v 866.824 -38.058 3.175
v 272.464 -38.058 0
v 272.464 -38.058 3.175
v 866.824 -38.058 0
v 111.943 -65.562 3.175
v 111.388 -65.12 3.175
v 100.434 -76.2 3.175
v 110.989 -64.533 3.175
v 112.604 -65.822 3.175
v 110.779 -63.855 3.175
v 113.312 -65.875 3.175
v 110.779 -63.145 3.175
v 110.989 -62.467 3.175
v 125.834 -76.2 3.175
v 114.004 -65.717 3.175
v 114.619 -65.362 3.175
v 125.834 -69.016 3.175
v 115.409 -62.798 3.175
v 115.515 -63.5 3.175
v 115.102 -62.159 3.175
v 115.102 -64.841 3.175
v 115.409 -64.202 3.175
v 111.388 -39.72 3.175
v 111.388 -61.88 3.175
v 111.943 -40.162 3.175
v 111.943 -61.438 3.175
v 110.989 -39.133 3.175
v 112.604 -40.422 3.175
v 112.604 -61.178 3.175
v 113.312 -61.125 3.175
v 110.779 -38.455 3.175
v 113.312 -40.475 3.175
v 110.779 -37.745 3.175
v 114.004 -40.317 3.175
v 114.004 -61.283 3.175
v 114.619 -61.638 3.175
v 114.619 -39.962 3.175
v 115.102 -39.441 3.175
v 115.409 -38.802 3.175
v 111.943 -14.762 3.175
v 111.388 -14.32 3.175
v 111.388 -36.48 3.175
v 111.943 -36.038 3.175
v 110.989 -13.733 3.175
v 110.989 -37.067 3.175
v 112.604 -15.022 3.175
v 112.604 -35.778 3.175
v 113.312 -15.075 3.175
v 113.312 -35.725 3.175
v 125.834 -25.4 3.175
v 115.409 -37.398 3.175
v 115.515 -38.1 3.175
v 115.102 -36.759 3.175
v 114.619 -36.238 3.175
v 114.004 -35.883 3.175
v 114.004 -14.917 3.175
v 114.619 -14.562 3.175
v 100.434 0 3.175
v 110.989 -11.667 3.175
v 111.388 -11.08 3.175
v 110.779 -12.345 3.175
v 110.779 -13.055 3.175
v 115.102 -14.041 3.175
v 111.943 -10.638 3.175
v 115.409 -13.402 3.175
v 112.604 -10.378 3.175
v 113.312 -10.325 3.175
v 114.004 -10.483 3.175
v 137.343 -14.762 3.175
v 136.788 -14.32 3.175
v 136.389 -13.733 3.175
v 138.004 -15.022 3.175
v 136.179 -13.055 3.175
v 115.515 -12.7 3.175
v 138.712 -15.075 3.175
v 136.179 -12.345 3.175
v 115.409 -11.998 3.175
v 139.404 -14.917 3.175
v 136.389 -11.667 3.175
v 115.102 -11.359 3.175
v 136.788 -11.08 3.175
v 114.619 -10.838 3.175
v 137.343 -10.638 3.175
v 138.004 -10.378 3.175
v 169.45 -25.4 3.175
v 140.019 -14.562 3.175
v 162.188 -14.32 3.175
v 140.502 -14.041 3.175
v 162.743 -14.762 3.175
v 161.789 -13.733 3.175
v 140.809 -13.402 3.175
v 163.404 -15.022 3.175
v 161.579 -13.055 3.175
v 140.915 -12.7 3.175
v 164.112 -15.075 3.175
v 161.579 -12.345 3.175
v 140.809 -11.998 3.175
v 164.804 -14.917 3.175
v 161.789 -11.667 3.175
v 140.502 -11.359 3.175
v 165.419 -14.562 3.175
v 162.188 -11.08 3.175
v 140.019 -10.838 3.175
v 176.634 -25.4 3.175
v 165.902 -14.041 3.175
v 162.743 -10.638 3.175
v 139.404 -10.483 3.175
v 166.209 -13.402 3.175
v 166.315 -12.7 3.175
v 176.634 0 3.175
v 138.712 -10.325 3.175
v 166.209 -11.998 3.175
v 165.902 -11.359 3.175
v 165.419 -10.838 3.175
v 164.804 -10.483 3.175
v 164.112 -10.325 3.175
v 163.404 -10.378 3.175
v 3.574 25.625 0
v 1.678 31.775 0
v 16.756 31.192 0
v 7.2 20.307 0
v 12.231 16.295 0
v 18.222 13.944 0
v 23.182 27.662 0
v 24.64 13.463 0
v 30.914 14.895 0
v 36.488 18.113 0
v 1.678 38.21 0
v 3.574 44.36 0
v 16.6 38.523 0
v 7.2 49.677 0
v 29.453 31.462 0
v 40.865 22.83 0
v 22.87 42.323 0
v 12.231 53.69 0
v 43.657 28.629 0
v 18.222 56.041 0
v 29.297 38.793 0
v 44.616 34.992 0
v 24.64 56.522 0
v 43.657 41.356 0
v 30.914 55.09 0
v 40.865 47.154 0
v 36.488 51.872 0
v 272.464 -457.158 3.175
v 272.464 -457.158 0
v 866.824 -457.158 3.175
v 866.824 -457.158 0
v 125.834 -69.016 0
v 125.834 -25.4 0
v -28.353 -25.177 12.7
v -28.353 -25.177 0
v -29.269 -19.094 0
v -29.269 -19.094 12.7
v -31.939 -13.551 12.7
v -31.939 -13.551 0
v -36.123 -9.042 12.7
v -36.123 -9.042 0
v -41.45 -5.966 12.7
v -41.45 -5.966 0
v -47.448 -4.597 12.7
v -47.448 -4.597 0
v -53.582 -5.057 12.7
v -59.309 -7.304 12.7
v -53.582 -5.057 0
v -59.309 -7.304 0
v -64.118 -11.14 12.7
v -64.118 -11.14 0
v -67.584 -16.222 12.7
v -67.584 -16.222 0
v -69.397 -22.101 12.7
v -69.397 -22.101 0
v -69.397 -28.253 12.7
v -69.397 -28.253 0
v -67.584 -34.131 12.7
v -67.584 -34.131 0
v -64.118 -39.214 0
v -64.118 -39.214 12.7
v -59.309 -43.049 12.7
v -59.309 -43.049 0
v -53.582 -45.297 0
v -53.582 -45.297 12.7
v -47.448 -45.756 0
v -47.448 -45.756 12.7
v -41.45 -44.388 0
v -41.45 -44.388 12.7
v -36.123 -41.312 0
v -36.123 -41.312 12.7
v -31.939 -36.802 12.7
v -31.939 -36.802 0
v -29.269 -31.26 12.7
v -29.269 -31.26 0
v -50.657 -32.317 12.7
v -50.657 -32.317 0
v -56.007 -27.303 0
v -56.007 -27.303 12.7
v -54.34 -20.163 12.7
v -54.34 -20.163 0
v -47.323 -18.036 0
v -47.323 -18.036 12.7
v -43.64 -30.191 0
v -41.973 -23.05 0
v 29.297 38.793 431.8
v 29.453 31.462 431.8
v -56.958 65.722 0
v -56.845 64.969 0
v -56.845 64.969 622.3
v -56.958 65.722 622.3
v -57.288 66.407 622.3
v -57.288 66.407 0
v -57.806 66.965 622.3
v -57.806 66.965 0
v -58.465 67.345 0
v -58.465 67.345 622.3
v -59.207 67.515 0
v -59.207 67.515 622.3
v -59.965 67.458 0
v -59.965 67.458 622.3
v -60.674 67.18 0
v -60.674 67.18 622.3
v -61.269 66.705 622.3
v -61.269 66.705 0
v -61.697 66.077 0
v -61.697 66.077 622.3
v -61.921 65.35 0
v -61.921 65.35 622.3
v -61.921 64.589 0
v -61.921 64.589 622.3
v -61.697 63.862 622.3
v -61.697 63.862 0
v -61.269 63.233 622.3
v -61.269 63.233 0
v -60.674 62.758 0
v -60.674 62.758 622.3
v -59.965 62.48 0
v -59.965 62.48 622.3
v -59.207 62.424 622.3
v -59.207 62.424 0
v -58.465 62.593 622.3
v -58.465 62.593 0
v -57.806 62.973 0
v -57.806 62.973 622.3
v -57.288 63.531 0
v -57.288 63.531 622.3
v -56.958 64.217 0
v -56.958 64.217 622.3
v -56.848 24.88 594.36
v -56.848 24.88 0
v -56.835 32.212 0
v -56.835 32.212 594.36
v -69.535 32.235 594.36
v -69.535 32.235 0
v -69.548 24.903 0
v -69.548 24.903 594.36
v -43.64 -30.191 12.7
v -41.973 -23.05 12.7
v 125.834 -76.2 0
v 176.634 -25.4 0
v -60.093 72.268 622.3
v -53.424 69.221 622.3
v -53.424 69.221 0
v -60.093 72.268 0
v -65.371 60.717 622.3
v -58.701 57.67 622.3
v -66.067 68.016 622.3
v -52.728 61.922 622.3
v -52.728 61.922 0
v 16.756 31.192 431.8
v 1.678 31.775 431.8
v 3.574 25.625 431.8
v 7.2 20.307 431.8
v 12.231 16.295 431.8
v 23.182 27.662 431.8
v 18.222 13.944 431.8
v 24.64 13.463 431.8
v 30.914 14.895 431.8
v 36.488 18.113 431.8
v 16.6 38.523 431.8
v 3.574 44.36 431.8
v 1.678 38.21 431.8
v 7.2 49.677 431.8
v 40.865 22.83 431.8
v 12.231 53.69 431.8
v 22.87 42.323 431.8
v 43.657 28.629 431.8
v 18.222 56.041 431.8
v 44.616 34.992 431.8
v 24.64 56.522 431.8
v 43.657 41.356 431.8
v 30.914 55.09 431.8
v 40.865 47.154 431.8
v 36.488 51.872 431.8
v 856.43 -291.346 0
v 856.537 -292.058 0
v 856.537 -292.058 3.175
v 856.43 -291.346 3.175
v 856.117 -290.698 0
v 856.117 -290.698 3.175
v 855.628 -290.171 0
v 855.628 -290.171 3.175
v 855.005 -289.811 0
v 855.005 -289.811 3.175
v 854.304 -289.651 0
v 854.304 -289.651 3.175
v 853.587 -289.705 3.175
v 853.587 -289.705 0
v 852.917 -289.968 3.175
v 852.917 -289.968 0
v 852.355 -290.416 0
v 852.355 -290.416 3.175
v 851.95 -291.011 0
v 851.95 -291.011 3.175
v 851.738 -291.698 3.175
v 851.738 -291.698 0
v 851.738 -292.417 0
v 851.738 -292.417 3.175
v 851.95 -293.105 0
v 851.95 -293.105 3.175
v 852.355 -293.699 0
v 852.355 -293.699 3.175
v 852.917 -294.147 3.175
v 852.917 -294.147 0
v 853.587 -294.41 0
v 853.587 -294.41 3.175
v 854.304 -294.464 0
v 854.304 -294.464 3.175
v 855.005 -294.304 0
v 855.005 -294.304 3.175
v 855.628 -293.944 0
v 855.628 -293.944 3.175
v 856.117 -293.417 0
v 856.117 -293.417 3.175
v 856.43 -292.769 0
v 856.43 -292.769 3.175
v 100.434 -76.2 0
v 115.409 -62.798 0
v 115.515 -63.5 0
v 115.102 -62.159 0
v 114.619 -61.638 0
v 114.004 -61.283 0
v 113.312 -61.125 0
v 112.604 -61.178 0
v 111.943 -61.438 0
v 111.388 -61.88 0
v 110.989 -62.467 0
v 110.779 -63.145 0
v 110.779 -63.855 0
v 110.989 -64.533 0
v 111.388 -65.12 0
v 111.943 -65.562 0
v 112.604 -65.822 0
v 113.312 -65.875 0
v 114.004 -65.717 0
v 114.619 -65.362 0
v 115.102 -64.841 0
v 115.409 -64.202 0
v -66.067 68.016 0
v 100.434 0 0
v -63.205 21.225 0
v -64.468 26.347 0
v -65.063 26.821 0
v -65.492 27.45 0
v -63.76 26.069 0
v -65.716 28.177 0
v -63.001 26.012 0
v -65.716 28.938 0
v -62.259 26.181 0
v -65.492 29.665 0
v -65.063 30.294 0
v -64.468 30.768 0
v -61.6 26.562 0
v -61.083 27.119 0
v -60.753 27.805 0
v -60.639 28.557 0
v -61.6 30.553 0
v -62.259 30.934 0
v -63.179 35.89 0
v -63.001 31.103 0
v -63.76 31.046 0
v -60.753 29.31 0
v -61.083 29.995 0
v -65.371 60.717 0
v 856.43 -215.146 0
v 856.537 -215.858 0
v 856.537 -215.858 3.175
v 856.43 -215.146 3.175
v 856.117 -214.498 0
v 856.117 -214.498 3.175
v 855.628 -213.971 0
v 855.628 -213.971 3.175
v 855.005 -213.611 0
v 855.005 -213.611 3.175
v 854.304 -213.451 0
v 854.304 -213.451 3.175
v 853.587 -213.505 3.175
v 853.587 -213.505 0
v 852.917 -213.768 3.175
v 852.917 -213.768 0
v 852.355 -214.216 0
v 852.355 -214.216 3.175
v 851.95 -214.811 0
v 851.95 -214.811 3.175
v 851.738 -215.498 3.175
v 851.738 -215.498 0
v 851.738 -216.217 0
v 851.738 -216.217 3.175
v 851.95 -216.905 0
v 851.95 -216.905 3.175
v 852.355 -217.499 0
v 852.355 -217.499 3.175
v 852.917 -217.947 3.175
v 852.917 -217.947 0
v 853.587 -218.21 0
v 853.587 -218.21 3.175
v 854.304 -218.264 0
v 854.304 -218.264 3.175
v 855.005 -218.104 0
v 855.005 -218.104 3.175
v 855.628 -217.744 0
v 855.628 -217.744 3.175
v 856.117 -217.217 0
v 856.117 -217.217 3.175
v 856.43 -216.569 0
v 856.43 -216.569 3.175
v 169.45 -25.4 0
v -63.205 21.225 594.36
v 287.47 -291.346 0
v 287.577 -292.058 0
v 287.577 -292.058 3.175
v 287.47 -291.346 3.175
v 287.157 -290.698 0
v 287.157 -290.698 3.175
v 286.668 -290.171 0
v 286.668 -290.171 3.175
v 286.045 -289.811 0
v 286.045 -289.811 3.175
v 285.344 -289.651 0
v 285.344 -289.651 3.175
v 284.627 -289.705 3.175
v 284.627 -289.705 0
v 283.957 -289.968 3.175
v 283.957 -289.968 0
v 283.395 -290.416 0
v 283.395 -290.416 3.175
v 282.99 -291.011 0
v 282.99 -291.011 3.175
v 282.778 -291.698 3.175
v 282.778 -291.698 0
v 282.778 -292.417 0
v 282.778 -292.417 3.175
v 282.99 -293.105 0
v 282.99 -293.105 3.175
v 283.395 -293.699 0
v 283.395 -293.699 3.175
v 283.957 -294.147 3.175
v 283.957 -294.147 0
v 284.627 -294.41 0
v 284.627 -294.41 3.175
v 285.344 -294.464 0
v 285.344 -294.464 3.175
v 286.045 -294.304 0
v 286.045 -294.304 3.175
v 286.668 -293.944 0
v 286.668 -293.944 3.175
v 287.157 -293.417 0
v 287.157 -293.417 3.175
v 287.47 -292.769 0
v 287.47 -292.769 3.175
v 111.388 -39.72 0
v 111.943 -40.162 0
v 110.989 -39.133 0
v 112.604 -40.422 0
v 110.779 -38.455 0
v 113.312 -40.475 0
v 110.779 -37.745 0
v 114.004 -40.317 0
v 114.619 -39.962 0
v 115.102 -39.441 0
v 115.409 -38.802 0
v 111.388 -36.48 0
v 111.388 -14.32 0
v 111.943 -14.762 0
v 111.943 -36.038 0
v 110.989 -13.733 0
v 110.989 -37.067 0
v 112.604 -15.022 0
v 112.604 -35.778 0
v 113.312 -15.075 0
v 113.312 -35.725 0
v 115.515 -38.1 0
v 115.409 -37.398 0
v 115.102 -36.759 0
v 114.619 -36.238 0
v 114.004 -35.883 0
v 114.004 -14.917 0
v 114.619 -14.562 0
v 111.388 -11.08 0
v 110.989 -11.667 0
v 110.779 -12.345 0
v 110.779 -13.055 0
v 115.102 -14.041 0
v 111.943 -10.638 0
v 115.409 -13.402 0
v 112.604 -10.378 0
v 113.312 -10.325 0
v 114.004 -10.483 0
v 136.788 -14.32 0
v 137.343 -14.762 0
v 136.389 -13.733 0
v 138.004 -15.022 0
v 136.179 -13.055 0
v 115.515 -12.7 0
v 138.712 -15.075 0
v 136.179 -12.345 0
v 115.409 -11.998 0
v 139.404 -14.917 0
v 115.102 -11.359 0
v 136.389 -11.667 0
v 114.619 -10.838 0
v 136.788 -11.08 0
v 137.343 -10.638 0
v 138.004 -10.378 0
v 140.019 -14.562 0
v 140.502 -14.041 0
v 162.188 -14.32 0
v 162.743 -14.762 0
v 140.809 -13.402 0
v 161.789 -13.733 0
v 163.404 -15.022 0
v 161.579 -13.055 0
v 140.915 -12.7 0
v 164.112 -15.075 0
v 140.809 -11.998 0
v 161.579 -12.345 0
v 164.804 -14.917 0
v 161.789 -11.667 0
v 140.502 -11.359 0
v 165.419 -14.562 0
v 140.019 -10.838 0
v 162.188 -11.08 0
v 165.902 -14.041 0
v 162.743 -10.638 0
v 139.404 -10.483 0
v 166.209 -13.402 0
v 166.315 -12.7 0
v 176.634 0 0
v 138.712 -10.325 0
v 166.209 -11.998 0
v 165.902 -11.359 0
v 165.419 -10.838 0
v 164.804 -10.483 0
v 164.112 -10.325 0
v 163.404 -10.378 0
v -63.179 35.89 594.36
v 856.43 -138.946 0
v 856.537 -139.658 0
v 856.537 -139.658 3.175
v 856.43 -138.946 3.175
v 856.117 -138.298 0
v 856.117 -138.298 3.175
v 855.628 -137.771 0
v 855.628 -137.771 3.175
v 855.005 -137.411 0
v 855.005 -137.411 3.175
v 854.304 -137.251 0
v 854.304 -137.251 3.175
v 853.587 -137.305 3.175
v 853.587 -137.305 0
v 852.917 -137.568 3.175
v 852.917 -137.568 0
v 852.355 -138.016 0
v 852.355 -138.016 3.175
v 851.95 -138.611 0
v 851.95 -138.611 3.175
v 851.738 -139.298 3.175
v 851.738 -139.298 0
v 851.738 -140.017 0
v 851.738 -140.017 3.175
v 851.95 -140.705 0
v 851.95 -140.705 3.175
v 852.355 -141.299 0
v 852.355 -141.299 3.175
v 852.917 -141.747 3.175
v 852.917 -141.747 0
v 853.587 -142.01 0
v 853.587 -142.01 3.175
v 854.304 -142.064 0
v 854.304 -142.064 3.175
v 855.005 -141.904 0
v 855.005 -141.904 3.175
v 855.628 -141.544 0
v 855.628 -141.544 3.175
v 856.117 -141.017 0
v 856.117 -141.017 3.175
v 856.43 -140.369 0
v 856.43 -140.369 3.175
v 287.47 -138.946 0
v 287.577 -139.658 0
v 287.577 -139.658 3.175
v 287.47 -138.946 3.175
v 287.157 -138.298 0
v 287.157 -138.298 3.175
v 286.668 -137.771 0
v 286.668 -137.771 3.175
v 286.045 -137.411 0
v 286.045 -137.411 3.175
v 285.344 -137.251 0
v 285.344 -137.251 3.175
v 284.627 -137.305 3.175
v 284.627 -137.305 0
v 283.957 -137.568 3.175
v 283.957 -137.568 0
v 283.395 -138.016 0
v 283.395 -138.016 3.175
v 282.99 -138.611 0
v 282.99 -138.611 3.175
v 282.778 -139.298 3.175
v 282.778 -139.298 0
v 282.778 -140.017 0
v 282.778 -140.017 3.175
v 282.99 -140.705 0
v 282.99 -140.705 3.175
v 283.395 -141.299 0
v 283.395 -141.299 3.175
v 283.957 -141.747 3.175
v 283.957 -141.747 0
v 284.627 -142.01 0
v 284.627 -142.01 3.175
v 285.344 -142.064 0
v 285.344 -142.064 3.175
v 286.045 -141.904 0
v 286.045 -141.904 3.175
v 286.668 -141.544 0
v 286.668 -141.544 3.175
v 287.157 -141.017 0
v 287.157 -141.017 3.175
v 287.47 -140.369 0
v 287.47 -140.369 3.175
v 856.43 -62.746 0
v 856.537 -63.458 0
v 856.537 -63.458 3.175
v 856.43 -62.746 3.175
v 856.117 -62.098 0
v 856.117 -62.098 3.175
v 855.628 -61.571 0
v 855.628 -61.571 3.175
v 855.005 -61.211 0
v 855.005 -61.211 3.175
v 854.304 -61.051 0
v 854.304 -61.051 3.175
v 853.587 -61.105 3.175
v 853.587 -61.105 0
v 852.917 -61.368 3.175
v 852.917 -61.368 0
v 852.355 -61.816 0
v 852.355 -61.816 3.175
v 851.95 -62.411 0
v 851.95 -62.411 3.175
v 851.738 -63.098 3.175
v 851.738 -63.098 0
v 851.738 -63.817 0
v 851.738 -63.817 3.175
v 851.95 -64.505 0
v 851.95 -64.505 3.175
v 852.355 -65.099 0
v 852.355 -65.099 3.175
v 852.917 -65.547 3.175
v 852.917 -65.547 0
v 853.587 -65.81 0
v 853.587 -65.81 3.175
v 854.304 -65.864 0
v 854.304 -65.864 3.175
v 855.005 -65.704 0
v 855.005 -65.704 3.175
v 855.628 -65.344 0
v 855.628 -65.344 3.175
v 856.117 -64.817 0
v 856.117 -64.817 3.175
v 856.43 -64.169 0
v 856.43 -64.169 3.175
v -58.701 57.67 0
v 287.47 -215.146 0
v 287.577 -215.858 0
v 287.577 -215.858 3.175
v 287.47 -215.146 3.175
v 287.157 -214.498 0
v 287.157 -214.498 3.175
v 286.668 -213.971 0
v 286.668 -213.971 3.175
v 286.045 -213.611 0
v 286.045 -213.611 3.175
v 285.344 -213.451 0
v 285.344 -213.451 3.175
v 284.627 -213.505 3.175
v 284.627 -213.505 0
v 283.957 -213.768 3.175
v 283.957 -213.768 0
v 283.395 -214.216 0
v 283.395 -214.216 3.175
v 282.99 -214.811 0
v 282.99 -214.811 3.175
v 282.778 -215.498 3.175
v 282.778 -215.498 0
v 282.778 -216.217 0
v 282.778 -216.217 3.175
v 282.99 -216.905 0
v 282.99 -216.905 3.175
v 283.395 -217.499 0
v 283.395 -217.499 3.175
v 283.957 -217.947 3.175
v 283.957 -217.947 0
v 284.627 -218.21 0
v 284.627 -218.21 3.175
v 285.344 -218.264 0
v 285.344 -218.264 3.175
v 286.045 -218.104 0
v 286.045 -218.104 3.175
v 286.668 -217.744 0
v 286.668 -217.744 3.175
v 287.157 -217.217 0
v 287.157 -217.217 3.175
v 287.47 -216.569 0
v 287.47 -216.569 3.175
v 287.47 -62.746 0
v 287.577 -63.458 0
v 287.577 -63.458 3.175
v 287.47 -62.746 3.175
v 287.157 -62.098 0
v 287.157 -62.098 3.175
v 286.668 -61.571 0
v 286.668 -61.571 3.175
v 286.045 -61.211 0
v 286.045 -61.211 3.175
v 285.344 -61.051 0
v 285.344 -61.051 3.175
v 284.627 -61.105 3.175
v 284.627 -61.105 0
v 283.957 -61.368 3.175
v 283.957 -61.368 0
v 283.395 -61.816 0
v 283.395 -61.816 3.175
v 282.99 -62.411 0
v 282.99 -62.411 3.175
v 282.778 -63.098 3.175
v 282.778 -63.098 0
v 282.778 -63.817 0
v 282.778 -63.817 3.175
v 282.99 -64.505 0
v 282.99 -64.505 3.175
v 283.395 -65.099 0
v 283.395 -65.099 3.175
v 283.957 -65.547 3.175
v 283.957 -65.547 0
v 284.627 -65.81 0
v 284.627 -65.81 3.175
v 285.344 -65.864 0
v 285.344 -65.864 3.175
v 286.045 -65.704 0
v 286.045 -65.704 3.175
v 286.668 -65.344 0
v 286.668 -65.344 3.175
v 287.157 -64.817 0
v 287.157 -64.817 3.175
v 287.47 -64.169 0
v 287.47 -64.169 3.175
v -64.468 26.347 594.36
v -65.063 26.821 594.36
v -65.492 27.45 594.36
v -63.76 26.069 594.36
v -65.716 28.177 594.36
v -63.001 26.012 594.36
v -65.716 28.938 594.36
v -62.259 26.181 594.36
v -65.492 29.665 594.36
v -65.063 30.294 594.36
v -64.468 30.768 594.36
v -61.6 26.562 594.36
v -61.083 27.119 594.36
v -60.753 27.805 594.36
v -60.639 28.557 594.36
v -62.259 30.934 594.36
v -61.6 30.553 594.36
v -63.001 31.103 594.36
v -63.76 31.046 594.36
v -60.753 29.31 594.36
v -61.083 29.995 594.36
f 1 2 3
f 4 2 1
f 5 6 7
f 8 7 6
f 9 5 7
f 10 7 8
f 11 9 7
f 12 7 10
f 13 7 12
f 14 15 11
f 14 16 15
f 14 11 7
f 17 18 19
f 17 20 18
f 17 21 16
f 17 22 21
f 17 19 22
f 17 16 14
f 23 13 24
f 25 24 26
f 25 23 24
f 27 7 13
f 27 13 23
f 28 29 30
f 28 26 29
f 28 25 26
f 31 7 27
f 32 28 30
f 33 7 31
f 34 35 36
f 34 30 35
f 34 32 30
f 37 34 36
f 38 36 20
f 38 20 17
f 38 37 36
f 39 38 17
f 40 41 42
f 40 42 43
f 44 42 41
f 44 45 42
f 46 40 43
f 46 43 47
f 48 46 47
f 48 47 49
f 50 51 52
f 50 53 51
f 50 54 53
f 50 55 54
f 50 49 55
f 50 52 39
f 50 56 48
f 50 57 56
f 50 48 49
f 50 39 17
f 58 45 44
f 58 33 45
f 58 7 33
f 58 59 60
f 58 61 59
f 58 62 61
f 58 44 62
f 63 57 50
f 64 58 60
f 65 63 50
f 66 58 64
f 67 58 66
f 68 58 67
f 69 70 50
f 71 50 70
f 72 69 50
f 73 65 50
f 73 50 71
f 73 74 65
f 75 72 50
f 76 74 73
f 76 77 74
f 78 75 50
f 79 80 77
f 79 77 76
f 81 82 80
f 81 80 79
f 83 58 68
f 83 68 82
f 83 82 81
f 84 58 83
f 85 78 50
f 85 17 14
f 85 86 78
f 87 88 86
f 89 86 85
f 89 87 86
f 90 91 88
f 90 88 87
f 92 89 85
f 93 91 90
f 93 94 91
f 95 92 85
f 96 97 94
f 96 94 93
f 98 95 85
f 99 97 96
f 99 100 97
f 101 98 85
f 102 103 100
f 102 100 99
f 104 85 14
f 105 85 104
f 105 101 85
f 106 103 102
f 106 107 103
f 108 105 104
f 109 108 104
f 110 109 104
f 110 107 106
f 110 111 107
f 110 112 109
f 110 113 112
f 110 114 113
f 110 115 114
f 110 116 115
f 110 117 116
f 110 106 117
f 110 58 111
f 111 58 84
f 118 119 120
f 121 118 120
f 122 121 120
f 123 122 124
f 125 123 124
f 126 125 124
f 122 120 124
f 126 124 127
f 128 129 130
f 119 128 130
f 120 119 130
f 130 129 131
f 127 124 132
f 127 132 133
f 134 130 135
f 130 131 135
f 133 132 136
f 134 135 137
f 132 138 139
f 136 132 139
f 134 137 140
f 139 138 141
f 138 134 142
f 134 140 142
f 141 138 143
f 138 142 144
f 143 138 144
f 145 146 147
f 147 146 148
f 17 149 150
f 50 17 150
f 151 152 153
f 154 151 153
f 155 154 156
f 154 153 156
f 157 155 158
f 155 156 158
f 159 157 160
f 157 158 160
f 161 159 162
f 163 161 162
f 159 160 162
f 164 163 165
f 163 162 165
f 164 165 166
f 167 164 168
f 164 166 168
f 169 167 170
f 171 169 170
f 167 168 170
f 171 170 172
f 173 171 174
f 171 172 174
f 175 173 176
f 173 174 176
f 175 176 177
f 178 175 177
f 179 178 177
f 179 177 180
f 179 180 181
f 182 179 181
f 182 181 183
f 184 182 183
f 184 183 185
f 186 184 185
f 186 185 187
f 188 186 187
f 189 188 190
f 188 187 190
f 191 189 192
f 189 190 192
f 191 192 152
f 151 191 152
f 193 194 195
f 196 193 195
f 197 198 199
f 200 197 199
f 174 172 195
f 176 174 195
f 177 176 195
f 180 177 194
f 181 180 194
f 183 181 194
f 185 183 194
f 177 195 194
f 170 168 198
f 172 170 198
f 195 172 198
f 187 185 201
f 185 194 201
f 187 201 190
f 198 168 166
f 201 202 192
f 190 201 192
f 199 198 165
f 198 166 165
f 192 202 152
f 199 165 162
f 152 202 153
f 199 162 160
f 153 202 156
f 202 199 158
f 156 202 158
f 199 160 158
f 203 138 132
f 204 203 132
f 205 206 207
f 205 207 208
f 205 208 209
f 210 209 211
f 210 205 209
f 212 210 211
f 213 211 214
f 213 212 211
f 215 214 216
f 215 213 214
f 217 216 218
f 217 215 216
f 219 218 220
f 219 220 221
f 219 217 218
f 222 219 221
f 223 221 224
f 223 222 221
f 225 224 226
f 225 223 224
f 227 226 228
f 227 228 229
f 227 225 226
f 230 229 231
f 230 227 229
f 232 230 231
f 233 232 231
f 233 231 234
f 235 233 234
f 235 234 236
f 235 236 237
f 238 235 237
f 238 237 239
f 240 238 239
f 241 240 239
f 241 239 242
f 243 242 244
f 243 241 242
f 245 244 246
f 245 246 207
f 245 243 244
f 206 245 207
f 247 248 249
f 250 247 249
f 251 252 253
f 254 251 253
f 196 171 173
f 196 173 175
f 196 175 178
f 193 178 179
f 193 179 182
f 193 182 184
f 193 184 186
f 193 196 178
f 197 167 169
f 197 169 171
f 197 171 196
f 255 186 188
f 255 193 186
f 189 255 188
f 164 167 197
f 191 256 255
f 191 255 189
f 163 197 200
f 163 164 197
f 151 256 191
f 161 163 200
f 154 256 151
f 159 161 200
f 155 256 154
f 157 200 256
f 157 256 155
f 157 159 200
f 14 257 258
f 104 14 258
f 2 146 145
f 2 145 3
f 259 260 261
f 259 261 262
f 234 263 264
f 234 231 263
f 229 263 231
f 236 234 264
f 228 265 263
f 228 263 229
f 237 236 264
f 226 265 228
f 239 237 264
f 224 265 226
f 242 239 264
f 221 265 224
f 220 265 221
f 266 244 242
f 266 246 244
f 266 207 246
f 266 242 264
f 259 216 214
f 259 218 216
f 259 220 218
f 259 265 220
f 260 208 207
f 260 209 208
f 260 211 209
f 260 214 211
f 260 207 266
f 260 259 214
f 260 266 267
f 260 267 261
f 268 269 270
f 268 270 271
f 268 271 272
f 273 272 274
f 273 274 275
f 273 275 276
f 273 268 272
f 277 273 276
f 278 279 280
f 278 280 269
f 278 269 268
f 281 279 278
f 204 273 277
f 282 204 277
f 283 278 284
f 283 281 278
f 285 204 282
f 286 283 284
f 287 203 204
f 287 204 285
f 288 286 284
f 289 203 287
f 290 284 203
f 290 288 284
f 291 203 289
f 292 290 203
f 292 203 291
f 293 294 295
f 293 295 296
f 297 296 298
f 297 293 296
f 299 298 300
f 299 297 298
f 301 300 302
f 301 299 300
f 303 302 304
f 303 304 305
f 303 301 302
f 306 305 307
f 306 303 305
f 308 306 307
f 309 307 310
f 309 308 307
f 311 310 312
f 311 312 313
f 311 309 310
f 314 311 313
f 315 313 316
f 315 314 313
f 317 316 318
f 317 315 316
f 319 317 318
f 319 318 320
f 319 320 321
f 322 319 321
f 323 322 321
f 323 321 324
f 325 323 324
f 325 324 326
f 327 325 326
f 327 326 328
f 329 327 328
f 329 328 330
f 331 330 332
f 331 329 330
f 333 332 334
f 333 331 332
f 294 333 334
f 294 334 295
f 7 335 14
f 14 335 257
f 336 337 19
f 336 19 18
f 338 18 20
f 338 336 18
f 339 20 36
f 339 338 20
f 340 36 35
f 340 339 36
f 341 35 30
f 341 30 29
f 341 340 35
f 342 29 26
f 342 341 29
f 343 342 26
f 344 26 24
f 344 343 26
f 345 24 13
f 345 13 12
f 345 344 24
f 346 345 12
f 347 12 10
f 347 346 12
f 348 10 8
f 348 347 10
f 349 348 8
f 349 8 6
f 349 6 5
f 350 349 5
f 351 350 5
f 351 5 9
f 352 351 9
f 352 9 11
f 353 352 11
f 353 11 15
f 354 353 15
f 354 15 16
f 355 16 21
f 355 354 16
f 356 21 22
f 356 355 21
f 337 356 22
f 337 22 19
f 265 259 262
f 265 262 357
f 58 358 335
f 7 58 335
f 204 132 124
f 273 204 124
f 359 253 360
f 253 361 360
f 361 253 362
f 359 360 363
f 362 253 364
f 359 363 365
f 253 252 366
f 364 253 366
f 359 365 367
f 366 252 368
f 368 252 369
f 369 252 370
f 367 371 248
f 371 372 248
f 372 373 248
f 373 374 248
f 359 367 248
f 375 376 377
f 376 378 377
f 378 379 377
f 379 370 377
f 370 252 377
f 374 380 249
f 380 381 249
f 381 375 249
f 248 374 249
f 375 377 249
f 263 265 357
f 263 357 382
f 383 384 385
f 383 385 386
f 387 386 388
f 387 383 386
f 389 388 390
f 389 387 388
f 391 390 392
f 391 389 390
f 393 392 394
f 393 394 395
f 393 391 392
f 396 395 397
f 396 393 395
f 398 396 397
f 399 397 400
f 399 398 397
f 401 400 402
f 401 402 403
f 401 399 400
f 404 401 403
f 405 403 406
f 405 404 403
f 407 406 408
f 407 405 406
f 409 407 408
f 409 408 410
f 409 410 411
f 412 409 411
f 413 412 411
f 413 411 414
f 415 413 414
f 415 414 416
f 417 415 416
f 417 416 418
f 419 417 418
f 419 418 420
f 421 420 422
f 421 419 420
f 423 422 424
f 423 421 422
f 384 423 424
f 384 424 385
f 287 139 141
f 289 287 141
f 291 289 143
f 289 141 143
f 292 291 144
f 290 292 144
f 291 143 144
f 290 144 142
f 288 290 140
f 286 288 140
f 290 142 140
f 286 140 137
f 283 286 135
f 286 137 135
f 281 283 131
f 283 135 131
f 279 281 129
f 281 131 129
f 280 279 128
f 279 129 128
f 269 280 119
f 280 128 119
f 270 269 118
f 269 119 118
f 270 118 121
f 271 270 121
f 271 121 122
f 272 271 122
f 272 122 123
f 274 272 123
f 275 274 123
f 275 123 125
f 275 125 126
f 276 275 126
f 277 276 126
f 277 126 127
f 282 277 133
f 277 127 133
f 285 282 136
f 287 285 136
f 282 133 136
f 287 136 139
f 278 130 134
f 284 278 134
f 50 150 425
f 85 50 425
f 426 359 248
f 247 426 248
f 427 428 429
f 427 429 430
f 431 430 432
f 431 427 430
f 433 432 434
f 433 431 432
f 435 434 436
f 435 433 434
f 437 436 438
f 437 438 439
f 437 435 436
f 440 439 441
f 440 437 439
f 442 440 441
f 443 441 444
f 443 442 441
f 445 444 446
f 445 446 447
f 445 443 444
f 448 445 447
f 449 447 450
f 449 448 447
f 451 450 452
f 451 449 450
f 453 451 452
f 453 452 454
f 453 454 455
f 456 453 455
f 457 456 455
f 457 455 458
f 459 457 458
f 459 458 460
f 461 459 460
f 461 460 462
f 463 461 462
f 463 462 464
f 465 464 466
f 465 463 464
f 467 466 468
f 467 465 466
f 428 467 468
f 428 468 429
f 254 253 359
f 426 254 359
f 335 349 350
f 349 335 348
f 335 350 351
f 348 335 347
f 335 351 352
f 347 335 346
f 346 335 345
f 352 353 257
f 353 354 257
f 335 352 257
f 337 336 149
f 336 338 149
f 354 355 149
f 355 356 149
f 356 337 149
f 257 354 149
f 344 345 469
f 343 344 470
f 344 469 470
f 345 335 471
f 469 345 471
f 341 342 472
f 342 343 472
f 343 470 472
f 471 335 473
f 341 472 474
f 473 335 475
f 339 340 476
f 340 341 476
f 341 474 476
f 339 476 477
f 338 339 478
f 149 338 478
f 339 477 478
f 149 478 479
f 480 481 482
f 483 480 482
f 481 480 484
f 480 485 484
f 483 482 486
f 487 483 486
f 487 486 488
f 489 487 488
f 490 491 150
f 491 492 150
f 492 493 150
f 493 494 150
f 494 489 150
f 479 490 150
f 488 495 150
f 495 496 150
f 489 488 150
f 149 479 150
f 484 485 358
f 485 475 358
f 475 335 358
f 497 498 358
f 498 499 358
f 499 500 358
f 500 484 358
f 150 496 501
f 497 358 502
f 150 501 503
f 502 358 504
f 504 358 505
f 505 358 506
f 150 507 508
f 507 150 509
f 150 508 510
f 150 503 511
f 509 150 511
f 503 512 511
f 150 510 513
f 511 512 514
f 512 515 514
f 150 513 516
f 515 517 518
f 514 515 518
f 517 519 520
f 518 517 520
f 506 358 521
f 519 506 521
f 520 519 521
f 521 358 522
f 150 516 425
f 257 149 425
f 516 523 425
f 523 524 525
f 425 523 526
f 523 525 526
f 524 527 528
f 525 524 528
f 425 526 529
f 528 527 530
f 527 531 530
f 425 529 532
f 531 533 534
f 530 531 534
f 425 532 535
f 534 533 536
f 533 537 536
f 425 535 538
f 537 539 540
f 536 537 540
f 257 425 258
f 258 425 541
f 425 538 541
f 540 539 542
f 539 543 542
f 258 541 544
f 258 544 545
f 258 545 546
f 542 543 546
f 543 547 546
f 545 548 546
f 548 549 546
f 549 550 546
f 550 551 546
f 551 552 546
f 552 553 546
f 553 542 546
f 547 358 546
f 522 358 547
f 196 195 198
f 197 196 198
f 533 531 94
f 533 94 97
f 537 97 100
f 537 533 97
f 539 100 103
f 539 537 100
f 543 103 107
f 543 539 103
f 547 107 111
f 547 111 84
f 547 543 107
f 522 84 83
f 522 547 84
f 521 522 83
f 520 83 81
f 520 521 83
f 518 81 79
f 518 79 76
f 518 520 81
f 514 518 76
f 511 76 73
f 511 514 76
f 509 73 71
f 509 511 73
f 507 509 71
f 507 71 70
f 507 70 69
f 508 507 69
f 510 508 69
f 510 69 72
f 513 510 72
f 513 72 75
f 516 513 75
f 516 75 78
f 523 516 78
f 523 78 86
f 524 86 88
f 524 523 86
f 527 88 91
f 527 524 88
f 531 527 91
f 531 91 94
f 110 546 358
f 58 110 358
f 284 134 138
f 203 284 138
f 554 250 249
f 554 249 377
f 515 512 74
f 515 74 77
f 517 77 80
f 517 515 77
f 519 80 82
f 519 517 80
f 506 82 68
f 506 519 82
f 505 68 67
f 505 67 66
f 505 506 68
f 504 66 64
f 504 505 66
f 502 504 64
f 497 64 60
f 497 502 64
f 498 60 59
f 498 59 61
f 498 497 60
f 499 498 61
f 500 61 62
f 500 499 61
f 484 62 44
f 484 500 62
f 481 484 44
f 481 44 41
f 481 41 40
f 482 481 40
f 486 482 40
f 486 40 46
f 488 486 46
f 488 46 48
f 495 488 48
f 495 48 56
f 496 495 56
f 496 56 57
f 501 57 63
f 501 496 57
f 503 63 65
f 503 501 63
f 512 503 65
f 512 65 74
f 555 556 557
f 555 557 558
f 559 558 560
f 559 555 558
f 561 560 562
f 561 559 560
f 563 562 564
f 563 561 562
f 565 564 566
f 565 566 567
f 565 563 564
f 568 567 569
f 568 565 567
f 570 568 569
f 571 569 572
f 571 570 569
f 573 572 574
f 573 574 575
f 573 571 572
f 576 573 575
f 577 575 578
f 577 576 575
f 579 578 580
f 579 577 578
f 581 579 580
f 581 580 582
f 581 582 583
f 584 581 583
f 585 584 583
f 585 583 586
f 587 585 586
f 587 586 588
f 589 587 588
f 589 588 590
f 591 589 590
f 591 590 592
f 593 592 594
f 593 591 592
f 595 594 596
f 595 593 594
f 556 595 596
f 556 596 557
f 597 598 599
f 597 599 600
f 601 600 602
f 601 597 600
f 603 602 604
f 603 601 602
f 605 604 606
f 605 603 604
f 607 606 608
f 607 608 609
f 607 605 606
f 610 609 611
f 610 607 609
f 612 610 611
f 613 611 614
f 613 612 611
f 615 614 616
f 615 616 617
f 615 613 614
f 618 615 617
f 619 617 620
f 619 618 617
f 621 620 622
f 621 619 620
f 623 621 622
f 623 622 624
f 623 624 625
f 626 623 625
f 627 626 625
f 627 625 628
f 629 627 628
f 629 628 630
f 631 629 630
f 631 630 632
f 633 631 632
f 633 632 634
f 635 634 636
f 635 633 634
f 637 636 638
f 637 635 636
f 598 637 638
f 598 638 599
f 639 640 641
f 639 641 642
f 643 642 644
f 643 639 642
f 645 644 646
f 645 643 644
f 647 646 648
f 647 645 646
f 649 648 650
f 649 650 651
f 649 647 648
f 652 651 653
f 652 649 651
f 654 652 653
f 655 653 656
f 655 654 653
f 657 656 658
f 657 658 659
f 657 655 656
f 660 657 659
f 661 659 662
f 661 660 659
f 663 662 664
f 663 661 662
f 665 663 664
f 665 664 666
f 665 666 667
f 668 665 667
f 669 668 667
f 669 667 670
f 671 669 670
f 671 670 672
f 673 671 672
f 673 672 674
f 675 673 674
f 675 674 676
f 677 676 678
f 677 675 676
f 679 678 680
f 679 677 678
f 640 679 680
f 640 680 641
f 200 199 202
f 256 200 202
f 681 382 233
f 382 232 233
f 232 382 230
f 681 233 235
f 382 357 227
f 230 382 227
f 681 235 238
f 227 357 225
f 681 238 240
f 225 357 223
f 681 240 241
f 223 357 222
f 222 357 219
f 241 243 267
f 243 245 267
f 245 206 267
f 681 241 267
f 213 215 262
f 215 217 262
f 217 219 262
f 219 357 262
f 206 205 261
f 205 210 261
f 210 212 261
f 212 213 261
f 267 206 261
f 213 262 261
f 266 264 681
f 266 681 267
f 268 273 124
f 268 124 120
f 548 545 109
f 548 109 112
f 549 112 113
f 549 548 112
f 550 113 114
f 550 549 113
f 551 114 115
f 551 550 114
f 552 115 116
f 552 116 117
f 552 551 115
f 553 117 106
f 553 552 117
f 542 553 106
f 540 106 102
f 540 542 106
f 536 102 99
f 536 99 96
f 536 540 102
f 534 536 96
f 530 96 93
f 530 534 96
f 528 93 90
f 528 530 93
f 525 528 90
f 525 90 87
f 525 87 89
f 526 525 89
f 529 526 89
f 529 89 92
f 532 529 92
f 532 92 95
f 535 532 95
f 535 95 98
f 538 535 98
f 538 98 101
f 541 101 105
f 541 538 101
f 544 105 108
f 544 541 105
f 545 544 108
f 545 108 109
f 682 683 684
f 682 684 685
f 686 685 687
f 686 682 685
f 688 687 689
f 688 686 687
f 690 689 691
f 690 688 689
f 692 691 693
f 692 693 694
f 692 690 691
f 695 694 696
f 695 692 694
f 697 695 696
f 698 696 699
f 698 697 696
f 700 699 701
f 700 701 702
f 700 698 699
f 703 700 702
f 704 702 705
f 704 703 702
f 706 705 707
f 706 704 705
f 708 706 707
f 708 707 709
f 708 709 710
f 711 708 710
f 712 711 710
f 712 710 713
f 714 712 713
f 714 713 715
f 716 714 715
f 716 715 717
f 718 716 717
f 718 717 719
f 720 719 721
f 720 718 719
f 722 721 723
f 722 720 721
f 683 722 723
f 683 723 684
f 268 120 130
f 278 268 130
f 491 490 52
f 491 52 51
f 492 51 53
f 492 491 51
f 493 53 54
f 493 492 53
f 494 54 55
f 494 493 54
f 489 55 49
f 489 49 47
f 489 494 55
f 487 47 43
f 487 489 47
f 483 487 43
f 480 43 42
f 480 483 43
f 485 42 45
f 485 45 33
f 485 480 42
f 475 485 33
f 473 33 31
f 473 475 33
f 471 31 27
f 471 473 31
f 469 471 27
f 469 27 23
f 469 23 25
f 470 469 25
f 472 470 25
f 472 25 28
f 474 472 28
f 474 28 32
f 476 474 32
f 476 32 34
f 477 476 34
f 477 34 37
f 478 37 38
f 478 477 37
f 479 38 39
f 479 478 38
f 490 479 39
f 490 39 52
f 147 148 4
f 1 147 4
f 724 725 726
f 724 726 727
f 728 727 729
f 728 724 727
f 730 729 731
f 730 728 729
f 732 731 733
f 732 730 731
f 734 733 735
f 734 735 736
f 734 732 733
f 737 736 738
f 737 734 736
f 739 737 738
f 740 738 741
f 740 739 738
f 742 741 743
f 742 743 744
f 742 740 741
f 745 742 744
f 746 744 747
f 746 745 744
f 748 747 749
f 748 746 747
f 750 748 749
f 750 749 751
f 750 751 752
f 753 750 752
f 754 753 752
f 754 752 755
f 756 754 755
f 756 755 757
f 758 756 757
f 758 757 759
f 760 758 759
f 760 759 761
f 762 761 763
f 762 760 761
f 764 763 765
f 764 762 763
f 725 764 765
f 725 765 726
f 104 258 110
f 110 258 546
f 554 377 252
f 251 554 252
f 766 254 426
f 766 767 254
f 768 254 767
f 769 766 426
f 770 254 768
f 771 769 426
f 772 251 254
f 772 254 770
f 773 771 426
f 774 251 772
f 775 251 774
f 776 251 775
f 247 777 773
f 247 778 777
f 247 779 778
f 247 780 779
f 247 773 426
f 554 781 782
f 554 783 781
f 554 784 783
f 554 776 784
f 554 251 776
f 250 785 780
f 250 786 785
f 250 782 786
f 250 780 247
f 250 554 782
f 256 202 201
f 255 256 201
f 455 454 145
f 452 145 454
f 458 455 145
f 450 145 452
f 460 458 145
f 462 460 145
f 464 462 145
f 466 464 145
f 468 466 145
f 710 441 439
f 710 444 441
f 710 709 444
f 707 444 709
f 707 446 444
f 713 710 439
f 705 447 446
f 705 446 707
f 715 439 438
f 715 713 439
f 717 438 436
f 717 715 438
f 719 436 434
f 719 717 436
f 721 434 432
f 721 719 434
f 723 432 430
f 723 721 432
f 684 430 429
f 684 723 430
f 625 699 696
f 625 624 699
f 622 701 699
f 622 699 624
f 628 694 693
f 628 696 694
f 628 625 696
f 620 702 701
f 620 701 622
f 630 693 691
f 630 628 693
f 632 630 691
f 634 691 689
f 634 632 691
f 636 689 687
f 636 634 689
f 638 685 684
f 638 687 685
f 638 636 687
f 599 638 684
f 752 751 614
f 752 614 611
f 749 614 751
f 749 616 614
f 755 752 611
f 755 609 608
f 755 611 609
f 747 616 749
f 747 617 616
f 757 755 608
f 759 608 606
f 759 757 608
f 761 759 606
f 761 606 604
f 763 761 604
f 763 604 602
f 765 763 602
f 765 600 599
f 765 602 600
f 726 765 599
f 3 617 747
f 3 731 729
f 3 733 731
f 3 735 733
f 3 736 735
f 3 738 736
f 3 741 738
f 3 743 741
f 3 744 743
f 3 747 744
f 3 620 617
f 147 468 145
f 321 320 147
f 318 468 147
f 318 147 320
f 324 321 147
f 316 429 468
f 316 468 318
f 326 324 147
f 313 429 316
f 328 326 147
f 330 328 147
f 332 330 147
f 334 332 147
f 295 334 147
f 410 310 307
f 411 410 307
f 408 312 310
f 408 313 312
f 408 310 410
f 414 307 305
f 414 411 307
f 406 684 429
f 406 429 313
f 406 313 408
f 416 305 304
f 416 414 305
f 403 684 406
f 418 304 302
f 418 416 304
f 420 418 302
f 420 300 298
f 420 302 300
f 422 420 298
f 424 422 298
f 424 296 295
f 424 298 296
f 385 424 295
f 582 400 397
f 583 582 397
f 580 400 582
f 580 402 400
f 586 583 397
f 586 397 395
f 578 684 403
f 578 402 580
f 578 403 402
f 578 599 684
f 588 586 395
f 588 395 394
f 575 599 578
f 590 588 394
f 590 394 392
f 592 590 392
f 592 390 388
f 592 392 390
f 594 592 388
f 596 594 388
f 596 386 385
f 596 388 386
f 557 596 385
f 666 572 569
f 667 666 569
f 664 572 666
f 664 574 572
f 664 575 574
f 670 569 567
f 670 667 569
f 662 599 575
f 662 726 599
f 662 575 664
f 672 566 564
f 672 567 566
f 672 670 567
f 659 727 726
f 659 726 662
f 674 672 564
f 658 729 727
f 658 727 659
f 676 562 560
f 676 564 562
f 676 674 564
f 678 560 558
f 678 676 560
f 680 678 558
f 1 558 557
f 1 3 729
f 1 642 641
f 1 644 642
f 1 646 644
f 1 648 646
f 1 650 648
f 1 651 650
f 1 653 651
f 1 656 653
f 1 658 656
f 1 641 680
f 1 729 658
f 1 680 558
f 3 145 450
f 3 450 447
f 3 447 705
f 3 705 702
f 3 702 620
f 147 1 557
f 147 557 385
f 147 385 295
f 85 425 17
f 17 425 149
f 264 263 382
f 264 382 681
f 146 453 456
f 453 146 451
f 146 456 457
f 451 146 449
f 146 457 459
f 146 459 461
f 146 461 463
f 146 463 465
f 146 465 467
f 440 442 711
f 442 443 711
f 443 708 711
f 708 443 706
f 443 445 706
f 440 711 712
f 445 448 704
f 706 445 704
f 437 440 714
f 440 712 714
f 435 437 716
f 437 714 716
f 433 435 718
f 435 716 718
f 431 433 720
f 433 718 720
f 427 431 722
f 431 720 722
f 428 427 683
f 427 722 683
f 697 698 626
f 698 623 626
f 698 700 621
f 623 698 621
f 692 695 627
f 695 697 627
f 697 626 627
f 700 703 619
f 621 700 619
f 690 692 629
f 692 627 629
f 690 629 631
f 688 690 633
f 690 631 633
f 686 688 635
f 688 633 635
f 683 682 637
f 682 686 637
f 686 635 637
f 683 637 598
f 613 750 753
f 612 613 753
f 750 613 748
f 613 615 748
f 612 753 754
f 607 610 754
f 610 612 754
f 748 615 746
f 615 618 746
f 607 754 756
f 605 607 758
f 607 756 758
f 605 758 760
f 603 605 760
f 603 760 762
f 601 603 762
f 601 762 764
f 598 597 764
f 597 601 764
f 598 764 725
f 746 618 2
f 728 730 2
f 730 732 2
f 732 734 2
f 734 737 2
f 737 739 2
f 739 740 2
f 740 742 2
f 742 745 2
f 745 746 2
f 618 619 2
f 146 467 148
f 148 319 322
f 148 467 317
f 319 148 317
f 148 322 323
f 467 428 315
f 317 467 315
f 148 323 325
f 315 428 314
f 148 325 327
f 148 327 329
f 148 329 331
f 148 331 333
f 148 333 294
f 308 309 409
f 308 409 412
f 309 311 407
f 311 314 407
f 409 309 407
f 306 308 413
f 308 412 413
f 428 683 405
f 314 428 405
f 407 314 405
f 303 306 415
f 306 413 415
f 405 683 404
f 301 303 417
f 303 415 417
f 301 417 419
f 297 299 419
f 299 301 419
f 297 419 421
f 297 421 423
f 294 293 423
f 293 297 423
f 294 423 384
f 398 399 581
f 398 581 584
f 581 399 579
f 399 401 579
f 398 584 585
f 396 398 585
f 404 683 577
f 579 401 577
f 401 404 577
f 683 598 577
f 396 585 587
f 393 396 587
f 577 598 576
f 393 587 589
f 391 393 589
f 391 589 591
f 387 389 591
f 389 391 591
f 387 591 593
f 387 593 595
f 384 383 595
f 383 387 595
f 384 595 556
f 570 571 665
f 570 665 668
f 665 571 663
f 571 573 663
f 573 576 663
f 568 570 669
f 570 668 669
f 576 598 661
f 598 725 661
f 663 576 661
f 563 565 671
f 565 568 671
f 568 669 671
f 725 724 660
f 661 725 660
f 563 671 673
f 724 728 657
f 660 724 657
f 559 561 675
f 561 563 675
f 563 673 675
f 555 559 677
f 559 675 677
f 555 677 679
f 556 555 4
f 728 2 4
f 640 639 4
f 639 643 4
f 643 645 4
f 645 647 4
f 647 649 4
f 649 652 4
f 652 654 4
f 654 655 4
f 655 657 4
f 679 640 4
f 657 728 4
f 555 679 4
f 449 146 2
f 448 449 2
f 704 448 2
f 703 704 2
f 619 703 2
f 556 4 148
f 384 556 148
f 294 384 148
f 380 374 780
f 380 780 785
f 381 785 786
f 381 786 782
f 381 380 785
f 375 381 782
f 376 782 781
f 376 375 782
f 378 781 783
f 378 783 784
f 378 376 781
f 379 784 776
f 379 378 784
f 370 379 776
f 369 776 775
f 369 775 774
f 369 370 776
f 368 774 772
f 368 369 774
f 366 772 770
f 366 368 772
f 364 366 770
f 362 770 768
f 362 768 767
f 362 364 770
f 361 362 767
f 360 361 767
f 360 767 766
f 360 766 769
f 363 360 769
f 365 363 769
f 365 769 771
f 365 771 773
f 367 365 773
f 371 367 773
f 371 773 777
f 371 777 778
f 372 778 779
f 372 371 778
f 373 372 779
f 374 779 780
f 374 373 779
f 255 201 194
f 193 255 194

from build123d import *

# Parameters (mm, degrees)
F0_R      = 2.5527
F1_DEPTH  = 622.3
F2_R      = 21.59
F3_DEPTH  = 431.8
F4_W      = 594.36
F4_H      = 419.1
F4_R      = 2.413
F5_DEPTH  = 3.175
F6_R      = 2.5527
F7_DEPTH  = 594.36
F8_R      = 20.6375
F9_DEPTH  = 12.7
F10_R     = 2.38125
F11_DEPTH = 3.175


# Not quite as in the source:
# - a length typed as a fraction of an inch, garbled in the dataset ("3 / 203.2 mm" for 3/8 in), is restored


with BuildPart() as f1:
    # F0 (on Top) → F1 (new body)
    with BuildSketch(Plane.XY):
        Polygon((-58.7014258881, 57.6698564189), (-52.7280128831, 61.9221111625), (-53.423867012, 69.221365944), (-60.0931341459, 72.2683659818), (-66.0665471509, 68.0161112382), (-65.370693022, 60.7168564567), align=None)
        with Locations((-59.397280017, 64.9691112003)):
            Circle(F0_R, mode=Mode.SUBTRACT)
    extrude(amount=F1_DEPTH)


with BuildPart() as f3:
    # F2 (on Top) → F3 (new body)
    with BuildSketch(Plane.XY):
        with Locations((23.0263769627, 34.9923484027)):
            Circle(F2_R)
        Polygon((29.2969861089, 38.7927160519), (29.4528964637, 31.4620254095), (23.1822873174, 27.6616577603), (16.7557678164, 31.1919807536), (16.5998574617, 38.522671396), (22.8704666079, 42.3230390451), align=None, mode=Mode.SUBTRACT)
    extrude(amount=F3_DEPTH)


with BuildPart() as f5:
    # F4 (on Top) → F5 (new body)
    with BuildSketch(Plane.XY):
        with Locations((569.643709116, -247.6076417923)):
            Rectangle(F4_W, F4_H)
        with Locations((285.163709116, -292.0576417923)):
            Circle(F4_R, mode=Mode.SUBTRACT)
        with Locations((854.123709116, -292.0576417923)):
            Circle(F4_R, mode=Mode.SUBTRACT)
        with Locations((285.163709116, -215.8576417923)):
            Circle(F4_R, mode=Mode.SUBTRACT)
        with Locations((285.163709116, -139.6576417923)):
            Circle(F4_R, mode=Mode.SUBTRACT)
        with Locations((285.163709116, -63.4576417923)):
            Circle(F4_R, mode=Mode.SUBTRACT)
        with Locations((854.123709116, -215.8576417923)):
            Circle(F4_R, mode=Mode.SUBTRACT)
        with Locations((854.123709116, -139.6576417923)):
            Circle(F4_R, mode=Mode.SUBTRACT)
        with Locations((854.123709116, -63.4576417923)):
            Circle(F4_R, mode=Mode.SUBTRACT)
    extrude(amount=F5_DEPTH)


with BuildPart() as f7:
    # F6 (on Top) → F7 (new body)
    with BuildSketch(Plane.XY):
        Polygon((-63.2050597455, 21.2249688073), (-56.8484997376, 24.8797572006), (-56.8353593278, 32.2120938447), (-63.1787789258, 35.8896420955), (-69.5353389336, 32.2348537022), (-69.5484793434, 24.9025170581), align=None)
        with Locations((-63.1919193356, 28.5573054514)):
            Circle(F6_R, mode=Mode.SUBTRACT)
    extrude(amount=F7_DEPTH)


with BuildPart() as f9:
    # F8 (on Top) → F9 (new body)
    with BuildSketch(Plane.XY):
        with Locations((-48.9900968969, -25.1767020673)):
            Circle(F8_R)
        Polygon((-41.9728598269, -23.0502690828), (-43.6399333779, -30.190591142), (-50.6571704479, -32.3170241264), (-56.0073339668, -27.3031350517), (-54.3402604158, -20.1628129925), (-47.3230233459, -18.0363800081), align=None, mode=Mode.SUBTRACT)
    extrude(amount=F9_DEPTH)


with BuildPart() as f11:
    # F10 (on Top) → F11 (new body)
    with BuildSketch(Plane.XY):
        Polygon((100.4340276122, 0), (100.4340276122, -76.2), (125.8340276122, -76.2), (176.6340276122, -25.4), (176.6340276122, 0), align=None)
        with Locations((113.1340276122, -63.5)):
            Circle(F10_R, mode=Mode.SUBTRACT)
        Polygon((125.8340276122, -25.4), (169.4498227154, -25.4), (125.8340276122, -69.0157951031), align=None, mode=Mode.SUBTRACT)
        with Locations((113.1340276122, -38.1)):
            Circle(F10_R, mode=Mode.SUBTRACT)
        with Locations((113.1340276122, -12.7)):
            Circle(F10_R, mode=Mode.SUBTRACT)
        with Locations((138.5340276122, -12.7)):
            Circle(F10_R, mode=Mode.SUBTRACT)
        with Locations((163.9340276122, -12.7)):
            Circle(F10_R, mode=Mode.SUBTRACT)
    extrude(amount=F11_DEPTH)


solid = Compound([f1.part, f3.part, f5.part, f7.part, f9.part, f11.part])
